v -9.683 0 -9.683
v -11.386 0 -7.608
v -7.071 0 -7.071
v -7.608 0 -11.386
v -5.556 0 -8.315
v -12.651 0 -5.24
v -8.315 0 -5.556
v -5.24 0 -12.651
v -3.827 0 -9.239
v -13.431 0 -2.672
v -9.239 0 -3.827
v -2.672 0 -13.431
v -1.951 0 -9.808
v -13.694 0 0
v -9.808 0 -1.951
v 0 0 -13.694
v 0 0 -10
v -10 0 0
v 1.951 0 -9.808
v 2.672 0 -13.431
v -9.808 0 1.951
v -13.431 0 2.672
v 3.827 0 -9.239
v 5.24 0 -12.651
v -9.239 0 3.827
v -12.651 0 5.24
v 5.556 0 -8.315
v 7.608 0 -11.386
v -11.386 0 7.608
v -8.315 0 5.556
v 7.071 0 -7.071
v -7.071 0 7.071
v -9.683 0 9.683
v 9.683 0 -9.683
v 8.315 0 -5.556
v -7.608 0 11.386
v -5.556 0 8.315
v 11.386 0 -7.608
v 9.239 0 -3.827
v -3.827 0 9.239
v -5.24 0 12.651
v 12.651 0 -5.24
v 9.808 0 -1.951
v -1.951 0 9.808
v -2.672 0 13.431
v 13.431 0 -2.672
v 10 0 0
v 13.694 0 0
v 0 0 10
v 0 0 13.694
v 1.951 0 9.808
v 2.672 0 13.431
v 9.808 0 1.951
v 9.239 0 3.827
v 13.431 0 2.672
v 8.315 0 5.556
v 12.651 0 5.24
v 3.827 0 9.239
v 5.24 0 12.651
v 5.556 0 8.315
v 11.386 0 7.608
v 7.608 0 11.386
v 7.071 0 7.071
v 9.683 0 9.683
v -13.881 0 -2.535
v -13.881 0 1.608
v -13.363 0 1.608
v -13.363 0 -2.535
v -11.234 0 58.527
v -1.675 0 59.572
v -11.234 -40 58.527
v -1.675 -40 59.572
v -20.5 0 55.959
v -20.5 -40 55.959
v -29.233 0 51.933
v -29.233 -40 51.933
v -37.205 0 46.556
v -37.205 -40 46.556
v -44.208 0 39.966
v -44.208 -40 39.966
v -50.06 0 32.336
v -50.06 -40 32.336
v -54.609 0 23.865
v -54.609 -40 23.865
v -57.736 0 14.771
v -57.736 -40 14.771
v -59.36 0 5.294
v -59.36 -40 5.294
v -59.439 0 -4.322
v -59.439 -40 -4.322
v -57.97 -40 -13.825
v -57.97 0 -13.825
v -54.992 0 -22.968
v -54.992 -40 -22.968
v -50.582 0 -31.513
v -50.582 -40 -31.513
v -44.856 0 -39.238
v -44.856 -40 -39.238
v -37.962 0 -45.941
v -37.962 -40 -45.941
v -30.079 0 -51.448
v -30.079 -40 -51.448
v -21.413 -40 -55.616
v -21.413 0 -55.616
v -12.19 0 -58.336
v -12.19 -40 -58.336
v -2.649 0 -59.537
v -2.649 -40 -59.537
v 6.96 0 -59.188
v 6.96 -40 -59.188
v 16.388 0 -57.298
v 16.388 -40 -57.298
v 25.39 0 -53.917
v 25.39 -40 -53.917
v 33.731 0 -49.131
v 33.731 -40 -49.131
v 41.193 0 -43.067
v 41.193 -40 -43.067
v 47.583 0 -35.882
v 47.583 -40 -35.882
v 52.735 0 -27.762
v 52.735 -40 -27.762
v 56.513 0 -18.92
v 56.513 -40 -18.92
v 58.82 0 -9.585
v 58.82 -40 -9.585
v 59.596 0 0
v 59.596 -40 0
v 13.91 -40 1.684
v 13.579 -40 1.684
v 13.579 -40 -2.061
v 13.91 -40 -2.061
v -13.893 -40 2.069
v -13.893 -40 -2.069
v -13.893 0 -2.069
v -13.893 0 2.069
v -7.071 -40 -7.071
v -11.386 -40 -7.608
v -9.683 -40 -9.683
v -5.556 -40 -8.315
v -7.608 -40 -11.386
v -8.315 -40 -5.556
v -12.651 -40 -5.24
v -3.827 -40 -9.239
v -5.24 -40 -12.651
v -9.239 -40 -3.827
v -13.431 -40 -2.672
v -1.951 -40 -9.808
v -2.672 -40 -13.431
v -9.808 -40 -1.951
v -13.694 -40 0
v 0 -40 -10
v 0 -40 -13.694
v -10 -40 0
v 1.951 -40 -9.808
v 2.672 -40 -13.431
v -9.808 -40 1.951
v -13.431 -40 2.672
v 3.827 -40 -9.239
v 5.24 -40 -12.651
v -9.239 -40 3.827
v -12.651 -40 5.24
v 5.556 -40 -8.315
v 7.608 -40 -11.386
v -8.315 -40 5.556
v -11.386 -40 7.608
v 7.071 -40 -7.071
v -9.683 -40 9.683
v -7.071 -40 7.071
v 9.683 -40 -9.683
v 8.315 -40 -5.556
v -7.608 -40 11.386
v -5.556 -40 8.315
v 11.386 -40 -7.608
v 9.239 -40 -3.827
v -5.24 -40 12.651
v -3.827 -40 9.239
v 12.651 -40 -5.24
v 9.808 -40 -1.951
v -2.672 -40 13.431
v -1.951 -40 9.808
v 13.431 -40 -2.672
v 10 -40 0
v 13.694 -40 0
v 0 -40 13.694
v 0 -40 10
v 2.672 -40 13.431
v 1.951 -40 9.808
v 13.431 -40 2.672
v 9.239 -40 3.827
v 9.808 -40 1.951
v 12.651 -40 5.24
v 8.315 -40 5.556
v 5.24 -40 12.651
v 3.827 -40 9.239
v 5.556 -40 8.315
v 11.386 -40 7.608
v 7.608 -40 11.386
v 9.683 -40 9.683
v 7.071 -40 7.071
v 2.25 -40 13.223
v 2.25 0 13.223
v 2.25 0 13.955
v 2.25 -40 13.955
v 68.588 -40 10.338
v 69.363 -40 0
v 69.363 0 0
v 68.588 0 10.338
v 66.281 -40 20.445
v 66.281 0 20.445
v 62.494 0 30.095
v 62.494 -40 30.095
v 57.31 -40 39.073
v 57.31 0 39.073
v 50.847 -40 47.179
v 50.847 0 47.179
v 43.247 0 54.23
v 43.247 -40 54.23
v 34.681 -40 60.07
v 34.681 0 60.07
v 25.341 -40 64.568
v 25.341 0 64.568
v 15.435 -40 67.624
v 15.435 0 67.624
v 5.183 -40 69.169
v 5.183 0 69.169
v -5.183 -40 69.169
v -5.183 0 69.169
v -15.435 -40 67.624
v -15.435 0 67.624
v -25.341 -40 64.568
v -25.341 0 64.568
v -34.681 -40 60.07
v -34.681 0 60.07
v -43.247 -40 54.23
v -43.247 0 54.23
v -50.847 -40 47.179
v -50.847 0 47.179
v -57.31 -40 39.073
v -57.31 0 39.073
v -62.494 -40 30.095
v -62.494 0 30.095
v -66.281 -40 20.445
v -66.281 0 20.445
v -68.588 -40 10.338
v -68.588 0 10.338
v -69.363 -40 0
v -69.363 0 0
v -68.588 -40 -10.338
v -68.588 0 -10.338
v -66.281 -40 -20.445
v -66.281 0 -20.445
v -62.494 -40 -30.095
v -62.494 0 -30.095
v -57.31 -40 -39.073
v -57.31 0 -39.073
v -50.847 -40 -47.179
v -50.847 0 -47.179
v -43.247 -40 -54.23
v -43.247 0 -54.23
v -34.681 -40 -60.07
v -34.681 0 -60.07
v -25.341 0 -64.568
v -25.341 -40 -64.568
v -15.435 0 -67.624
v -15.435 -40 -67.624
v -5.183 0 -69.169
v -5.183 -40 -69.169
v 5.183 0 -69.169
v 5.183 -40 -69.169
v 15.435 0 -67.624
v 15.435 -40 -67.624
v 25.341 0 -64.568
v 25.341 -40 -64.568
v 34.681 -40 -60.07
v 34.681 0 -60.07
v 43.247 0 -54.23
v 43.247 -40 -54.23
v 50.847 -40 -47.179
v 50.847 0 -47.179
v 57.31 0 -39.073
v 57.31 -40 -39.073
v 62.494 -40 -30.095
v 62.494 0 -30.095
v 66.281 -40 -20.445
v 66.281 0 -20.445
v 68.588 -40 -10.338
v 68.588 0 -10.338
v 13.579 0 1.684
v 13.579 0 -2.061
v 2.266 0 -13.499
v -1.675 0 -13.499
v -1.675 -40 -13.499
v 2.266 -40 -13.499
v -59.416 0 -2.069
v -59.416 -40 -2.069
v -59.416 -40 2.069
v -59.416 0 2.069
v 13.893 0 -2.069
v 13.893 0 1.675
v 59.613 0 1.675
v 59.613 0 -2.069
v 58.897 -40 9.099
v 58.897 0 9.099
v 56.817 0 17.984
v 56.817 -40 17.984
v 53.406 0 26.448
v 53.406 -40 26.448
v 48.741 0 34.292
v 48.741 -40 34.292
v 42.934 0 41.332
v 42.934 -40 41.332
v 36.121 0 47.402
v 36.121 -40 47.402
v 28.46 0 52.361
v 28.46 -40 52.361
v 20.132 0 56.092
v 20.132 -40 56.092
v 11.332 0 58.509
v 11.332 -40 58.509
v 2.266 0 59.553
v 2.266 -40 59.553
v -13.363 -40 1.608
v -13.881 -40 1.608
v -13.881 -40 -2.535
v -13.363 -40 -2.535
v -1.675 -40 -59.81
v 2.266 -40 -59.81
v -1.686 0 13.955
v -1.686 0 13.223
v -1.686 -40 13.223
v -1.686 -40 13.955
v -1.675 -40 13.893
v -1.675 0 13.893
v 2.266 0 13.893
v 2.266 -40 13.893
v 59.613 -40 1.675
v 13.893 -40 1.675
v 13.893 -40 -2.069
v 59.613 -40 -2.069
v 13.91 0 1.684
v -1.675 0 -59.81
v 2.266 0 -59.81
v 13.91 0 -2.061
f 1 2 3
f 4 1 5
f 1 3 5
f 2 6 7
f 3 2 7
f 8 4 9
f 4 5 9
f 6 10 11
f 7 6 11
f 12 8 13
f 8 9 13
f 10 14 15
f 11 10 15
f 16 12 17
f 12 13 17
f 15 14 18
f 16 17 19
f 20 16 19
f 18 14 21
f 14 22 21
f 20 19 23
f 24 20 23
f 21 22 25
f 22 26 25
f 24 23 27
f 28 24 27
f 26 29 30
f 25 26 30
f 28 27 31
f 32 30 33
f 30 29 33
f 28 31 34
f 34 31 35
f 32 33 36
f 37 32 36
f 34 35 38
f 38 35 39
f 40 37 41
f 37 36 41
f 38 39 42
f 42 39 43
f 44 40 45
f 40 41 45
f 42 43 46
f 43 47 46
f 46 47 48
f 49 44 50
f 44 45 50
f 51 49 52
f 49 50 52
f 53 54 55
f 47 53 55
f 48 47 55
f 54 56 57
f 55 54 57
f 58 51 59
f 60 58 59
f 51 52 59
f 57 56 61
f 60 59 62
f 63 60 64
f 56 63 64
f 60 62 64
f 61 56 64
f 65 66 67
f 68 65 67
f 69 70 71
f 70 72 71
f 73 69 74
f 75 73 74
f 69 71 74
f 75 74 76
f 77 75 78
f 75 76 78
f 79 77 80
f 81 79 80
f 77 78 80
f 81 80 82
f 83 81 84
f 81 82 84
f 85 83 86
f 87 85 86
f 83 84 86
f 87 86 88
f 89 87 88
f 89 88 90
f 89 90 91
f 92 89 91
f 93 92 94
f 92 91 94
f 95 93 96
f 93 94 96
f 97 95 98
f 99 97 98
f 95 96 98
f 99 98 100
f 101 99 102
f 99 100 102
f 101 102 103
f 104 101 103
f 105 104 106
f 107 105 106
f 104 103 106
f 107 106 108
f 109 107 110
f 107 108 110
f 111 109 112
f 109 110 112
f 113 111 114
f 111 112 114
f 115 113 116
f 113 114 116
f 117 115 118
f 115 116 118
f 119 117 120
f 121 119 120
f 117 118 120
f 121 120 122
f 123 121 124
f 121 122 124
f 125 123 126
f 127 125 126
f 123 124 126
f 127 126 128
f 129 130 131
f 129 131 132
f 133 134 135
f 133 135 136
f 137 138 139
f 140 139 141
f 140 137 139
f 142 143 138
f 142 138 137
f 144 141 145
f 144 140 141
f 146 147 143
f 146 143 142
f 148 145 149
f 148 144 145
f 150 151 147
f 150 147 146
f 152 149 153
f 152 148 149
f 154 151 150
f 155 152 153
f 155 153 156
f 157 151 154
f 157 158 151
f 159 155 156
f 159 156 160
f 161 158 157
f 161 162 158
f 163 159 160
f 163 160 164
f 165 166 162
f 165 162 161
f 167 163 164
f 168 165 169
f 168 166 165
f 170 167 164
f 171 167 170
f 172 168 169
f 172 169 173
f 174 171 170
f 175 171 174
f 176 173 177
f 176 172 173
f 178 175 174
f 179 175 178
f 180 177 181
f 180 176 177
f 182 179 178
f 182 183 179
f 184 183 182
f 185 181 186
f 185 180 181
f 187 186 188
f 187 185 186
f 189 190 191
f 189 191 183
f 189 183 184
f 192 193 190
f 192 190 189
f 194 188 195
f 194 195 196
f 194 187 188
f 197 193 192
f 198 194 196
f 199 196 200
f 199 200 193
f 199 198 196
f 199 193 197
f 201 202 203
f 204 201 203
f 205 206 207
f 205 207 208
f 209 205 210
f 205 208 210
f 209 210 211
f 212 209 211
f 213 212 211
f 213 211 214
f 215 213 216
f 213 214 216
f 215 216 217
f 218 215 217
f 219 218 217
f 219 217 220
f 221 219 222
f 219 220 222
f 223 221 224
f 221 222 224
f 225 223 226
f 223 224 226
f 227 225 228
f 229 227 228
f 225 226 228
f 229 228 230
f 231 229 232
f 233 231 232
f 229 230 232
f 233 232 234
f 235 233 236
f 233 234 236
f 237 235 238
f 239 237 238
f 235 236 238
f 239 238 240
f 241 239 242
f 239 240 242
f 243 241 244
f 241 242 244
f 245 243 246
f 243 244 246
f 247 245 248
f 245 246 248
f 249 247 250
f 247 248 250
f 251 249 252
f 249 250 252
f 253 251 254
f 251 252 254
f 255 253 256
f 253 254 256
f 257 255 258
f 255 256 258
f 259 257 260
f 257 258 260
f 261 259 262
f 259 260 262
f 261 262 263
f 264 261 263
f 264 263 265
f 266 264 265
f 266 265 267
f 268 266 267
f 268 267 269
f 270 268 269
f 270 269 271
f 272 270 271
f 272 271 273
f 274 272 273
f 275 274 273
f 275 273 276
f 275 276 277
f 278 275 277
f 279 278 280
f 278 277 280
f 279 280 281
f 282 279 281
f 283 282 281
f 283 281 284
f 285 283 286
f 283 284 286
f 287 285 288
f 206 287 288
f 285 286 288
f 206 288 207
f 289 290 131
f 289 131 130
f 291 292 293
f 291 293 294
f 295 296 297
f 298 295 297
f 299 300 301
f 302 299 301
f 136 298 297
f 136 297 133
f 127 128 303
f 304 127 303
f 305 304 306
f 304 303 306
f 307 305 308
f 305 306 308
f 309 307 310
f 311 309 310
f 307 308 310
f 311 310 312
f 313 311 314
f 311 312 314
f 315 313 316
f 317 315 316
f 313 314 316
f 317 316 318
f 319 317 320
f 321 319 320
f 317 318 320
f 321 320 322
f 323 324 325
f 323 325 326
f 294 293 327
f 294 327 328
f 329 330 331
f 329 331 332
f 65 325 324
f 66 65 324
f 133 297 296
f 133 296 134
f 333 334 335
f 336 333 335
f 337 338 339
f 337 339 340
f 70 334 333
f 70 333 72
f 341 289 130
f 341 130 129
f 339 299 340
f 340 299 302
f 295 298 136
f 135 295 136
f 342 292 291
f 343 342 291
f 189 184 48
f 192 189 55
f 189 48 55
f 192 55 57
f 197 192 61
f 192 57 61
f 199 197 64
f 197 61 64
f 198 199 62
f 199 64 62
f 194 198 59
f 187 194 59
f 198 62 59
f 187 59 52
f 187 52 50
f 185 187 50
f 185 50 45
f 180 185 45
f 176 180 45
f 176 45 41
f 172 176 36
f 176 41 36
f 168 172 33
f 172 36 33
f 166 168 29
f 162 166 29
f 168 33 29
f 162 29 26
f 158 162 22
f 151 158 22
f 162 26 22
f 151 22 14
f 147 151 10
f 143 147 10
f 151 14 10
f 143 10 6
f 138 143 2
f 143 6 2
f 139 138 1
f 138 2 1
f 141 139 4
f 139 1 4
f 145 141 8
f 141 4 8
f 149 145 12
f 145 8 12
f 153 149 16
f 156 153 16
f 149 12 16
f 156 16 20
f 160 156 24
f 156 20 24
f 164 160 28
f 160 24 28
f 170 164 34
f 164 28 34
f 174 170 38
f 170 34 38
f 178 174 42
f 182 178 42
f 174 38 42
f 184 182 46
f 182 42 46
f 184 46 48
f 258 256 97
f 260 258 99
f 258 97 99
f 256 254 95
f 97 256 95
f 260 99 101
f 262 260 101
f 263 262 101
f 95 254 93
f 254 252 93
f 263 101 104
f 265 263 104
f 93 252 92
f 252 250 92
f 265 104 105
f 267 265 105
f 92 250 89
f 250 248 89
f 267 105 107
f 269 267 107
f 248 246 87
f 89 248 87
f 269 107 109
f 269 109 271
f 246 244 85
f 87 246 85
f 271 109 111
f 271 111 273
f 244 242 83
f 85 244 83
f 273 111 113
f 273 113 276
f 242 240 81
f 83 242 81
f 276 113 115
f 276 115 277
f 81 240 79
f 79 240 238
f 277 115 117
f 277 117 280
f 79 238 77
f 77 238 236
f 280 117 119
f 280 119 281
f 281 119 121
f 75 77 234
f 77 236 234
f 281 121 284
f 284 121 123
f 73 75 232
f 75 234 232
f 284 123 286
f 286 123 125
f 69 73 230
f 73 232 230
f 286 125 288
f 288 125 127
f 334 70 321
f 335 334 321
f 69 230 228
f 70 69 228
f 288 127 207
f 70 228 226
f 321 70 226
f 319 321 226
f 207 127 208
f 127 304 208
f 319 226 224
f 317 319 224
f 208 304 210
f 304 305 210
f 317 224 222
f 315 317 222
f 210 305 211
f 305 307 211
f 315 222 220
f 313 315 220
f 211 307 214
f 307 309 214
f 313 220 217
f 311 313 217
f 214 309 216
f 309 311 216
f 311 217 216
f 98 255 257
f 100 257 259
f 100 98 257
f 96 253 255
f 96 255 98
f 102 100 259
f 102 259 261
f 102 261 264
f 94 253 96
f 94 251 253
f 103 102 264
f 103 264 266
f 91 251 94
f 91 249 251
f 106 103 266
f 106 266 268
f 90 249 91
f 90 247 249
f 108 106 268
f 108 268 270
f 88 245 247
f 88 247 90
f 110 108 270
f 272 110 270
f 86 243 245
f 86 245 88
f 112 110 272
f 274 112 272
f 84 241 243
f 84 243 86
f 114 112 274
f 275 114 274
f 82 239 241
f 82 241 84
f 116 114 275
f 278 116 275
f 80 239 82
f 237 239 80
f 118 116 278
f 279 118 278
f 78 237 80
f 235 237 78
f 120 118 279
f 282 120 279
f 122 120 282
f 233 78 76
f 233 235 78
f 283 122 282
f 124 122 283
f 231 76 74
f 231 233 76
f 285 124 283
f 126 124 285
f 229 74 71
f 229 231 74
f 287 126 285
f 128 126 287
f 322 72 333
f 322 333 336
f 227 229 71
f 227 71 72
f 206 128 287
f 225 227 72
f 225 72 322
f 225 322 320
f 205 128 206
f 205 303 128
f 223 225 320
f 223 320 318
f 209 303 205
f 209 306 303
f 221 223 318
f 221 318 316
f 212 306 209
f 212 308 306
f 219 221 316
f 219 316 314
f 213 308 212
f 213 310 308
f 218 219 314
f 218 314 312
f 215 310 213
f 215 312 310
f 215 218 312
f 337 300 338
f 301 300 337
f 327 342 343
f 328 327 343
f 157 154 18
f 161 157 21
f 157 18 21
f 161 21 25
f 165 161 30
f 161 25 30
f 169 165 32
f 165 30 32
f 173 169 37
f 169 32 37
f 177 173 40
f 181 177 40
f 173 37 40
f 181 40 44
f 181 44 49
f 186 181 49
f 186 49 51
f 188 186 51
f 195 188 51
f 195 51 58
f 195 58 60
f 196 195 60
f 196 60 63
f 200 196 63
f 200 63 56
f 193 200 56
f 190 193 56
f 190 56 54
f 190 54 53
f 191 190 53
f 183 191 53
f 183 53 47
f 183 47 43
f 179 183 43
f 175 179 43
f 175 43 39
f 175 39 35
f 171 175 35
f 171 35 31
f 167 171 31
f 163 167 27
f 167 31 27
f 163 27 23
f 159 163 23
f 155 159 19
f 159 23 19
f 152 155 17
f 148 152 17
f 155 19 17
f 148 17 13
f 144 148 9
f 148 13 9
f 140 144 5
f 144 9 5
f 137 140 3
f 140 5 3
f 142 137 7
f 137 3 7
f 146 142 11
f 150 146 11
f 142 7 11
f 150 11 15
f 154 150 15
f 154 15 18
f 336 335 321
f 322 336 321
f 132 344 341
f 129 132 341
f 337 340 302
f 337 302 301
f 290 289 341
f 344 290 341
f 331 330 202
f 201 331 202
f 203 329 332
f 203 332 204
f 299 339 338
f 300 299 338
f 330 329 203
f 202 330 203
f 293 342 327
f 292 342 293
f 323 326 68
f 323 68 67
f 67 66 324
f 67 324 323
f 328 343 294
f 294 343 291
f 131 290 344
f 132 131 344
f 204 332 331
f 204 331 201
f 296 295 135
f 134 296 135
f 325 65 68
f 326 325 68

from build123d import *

# Parameters (mm, degrees)
F0_R      = 69.362817
F2_DEPTH  = 40
F3_R      = 59.595856
F4_DEPTH  = 40
F1_R      = 13.693812
F5_DEPTH  = 40
F6_W      = 3.941379
F6_H      = 45.917072
F7_DEPTH  = 40
F8_W      = 45.522932
F8_H      = 4.138448
F8_W_2    = 45.720002
F8_H_2    = 3.74431
F8_W_3    = 3.941379
F8_H_3    = 46.311209
F9_DEPTH  = 40
F11_D     = 20
F12_W     = 0.330953
F12_H     = 3.745289
F12_W_2   = 3.936603
F12_H_2   = 0.731638
F12_W_3   = 0.517858
F12_H_3   = 4.143185
F13_DEPTH = 40


with BuildPart() as f2:
    # F0 (on Front) → F2 (new body)
    with BuildSketch(Plane.XZ):
        Circle(F0_R)
    extrude(amount=F2_DEPTH)

    # F3 (on face) → F4 (cut)
    with BuildSketch(Plane.XZ.offset(40)):
        Circle(F3_R)
    extrude(amount=-F4_DEPTH, mode=Mode.SUBTRACT)

    # F6 (on Front) → F7 (join)
    with BuildSketch(Plane.XZ):
        with Locations((0.295602, 36.851898)):
            Rectangle(F6_W, F6_H)
    extrude(amount=F7_DEPTH)


with BuildPart() as f5:
    # F1 (on Front) → F5 (new body)
    with BuildSketch(Plane.XZ):
        Circle(F1_R)
    extrude(amount=F5_DEPTH)

    # F11 (through all)
    with Locations(Plane.XZ.offset(40)):
        with Locations((0, 0)):
            Hole(F11_D / 2)


with BuildPart() as f9:
    # F8 (on Front) → F9 (new body)
    with BuildSketch(Plane.XZ):
        with Locations((-36.654828, 0)):
            Rectangle(F8_W, F8_H)
        with Locations((36.753361, -0.197069)):
            Rectangle(F8_W_2, F8_H_2)
        with Locations((0.295602, -36.654829)):
            Rectangle(F8_W_3, F8_H_3)
    extrude(amount=F9_DEPTH)


with BuildPart() as f13:
    # F12 (on Front) → F13 (new body)
    with BuildSketch(Plane.XZ):
        with Locations((13.744317, -0.188713)):
            Rectangle(F12_W, F12_H)
        with Locations((0.282053, 13.589272)):
            Rectangle(F12_W_2, F12_H_2)
        with Locations((-13.621716, -0.46342)):
            Rectangle(F12_W_3, F12_H_3)
    extrude(amount=F13_DEPTH)


solid = Compound([f2.part, f5.part, f9.part, f13.part])
